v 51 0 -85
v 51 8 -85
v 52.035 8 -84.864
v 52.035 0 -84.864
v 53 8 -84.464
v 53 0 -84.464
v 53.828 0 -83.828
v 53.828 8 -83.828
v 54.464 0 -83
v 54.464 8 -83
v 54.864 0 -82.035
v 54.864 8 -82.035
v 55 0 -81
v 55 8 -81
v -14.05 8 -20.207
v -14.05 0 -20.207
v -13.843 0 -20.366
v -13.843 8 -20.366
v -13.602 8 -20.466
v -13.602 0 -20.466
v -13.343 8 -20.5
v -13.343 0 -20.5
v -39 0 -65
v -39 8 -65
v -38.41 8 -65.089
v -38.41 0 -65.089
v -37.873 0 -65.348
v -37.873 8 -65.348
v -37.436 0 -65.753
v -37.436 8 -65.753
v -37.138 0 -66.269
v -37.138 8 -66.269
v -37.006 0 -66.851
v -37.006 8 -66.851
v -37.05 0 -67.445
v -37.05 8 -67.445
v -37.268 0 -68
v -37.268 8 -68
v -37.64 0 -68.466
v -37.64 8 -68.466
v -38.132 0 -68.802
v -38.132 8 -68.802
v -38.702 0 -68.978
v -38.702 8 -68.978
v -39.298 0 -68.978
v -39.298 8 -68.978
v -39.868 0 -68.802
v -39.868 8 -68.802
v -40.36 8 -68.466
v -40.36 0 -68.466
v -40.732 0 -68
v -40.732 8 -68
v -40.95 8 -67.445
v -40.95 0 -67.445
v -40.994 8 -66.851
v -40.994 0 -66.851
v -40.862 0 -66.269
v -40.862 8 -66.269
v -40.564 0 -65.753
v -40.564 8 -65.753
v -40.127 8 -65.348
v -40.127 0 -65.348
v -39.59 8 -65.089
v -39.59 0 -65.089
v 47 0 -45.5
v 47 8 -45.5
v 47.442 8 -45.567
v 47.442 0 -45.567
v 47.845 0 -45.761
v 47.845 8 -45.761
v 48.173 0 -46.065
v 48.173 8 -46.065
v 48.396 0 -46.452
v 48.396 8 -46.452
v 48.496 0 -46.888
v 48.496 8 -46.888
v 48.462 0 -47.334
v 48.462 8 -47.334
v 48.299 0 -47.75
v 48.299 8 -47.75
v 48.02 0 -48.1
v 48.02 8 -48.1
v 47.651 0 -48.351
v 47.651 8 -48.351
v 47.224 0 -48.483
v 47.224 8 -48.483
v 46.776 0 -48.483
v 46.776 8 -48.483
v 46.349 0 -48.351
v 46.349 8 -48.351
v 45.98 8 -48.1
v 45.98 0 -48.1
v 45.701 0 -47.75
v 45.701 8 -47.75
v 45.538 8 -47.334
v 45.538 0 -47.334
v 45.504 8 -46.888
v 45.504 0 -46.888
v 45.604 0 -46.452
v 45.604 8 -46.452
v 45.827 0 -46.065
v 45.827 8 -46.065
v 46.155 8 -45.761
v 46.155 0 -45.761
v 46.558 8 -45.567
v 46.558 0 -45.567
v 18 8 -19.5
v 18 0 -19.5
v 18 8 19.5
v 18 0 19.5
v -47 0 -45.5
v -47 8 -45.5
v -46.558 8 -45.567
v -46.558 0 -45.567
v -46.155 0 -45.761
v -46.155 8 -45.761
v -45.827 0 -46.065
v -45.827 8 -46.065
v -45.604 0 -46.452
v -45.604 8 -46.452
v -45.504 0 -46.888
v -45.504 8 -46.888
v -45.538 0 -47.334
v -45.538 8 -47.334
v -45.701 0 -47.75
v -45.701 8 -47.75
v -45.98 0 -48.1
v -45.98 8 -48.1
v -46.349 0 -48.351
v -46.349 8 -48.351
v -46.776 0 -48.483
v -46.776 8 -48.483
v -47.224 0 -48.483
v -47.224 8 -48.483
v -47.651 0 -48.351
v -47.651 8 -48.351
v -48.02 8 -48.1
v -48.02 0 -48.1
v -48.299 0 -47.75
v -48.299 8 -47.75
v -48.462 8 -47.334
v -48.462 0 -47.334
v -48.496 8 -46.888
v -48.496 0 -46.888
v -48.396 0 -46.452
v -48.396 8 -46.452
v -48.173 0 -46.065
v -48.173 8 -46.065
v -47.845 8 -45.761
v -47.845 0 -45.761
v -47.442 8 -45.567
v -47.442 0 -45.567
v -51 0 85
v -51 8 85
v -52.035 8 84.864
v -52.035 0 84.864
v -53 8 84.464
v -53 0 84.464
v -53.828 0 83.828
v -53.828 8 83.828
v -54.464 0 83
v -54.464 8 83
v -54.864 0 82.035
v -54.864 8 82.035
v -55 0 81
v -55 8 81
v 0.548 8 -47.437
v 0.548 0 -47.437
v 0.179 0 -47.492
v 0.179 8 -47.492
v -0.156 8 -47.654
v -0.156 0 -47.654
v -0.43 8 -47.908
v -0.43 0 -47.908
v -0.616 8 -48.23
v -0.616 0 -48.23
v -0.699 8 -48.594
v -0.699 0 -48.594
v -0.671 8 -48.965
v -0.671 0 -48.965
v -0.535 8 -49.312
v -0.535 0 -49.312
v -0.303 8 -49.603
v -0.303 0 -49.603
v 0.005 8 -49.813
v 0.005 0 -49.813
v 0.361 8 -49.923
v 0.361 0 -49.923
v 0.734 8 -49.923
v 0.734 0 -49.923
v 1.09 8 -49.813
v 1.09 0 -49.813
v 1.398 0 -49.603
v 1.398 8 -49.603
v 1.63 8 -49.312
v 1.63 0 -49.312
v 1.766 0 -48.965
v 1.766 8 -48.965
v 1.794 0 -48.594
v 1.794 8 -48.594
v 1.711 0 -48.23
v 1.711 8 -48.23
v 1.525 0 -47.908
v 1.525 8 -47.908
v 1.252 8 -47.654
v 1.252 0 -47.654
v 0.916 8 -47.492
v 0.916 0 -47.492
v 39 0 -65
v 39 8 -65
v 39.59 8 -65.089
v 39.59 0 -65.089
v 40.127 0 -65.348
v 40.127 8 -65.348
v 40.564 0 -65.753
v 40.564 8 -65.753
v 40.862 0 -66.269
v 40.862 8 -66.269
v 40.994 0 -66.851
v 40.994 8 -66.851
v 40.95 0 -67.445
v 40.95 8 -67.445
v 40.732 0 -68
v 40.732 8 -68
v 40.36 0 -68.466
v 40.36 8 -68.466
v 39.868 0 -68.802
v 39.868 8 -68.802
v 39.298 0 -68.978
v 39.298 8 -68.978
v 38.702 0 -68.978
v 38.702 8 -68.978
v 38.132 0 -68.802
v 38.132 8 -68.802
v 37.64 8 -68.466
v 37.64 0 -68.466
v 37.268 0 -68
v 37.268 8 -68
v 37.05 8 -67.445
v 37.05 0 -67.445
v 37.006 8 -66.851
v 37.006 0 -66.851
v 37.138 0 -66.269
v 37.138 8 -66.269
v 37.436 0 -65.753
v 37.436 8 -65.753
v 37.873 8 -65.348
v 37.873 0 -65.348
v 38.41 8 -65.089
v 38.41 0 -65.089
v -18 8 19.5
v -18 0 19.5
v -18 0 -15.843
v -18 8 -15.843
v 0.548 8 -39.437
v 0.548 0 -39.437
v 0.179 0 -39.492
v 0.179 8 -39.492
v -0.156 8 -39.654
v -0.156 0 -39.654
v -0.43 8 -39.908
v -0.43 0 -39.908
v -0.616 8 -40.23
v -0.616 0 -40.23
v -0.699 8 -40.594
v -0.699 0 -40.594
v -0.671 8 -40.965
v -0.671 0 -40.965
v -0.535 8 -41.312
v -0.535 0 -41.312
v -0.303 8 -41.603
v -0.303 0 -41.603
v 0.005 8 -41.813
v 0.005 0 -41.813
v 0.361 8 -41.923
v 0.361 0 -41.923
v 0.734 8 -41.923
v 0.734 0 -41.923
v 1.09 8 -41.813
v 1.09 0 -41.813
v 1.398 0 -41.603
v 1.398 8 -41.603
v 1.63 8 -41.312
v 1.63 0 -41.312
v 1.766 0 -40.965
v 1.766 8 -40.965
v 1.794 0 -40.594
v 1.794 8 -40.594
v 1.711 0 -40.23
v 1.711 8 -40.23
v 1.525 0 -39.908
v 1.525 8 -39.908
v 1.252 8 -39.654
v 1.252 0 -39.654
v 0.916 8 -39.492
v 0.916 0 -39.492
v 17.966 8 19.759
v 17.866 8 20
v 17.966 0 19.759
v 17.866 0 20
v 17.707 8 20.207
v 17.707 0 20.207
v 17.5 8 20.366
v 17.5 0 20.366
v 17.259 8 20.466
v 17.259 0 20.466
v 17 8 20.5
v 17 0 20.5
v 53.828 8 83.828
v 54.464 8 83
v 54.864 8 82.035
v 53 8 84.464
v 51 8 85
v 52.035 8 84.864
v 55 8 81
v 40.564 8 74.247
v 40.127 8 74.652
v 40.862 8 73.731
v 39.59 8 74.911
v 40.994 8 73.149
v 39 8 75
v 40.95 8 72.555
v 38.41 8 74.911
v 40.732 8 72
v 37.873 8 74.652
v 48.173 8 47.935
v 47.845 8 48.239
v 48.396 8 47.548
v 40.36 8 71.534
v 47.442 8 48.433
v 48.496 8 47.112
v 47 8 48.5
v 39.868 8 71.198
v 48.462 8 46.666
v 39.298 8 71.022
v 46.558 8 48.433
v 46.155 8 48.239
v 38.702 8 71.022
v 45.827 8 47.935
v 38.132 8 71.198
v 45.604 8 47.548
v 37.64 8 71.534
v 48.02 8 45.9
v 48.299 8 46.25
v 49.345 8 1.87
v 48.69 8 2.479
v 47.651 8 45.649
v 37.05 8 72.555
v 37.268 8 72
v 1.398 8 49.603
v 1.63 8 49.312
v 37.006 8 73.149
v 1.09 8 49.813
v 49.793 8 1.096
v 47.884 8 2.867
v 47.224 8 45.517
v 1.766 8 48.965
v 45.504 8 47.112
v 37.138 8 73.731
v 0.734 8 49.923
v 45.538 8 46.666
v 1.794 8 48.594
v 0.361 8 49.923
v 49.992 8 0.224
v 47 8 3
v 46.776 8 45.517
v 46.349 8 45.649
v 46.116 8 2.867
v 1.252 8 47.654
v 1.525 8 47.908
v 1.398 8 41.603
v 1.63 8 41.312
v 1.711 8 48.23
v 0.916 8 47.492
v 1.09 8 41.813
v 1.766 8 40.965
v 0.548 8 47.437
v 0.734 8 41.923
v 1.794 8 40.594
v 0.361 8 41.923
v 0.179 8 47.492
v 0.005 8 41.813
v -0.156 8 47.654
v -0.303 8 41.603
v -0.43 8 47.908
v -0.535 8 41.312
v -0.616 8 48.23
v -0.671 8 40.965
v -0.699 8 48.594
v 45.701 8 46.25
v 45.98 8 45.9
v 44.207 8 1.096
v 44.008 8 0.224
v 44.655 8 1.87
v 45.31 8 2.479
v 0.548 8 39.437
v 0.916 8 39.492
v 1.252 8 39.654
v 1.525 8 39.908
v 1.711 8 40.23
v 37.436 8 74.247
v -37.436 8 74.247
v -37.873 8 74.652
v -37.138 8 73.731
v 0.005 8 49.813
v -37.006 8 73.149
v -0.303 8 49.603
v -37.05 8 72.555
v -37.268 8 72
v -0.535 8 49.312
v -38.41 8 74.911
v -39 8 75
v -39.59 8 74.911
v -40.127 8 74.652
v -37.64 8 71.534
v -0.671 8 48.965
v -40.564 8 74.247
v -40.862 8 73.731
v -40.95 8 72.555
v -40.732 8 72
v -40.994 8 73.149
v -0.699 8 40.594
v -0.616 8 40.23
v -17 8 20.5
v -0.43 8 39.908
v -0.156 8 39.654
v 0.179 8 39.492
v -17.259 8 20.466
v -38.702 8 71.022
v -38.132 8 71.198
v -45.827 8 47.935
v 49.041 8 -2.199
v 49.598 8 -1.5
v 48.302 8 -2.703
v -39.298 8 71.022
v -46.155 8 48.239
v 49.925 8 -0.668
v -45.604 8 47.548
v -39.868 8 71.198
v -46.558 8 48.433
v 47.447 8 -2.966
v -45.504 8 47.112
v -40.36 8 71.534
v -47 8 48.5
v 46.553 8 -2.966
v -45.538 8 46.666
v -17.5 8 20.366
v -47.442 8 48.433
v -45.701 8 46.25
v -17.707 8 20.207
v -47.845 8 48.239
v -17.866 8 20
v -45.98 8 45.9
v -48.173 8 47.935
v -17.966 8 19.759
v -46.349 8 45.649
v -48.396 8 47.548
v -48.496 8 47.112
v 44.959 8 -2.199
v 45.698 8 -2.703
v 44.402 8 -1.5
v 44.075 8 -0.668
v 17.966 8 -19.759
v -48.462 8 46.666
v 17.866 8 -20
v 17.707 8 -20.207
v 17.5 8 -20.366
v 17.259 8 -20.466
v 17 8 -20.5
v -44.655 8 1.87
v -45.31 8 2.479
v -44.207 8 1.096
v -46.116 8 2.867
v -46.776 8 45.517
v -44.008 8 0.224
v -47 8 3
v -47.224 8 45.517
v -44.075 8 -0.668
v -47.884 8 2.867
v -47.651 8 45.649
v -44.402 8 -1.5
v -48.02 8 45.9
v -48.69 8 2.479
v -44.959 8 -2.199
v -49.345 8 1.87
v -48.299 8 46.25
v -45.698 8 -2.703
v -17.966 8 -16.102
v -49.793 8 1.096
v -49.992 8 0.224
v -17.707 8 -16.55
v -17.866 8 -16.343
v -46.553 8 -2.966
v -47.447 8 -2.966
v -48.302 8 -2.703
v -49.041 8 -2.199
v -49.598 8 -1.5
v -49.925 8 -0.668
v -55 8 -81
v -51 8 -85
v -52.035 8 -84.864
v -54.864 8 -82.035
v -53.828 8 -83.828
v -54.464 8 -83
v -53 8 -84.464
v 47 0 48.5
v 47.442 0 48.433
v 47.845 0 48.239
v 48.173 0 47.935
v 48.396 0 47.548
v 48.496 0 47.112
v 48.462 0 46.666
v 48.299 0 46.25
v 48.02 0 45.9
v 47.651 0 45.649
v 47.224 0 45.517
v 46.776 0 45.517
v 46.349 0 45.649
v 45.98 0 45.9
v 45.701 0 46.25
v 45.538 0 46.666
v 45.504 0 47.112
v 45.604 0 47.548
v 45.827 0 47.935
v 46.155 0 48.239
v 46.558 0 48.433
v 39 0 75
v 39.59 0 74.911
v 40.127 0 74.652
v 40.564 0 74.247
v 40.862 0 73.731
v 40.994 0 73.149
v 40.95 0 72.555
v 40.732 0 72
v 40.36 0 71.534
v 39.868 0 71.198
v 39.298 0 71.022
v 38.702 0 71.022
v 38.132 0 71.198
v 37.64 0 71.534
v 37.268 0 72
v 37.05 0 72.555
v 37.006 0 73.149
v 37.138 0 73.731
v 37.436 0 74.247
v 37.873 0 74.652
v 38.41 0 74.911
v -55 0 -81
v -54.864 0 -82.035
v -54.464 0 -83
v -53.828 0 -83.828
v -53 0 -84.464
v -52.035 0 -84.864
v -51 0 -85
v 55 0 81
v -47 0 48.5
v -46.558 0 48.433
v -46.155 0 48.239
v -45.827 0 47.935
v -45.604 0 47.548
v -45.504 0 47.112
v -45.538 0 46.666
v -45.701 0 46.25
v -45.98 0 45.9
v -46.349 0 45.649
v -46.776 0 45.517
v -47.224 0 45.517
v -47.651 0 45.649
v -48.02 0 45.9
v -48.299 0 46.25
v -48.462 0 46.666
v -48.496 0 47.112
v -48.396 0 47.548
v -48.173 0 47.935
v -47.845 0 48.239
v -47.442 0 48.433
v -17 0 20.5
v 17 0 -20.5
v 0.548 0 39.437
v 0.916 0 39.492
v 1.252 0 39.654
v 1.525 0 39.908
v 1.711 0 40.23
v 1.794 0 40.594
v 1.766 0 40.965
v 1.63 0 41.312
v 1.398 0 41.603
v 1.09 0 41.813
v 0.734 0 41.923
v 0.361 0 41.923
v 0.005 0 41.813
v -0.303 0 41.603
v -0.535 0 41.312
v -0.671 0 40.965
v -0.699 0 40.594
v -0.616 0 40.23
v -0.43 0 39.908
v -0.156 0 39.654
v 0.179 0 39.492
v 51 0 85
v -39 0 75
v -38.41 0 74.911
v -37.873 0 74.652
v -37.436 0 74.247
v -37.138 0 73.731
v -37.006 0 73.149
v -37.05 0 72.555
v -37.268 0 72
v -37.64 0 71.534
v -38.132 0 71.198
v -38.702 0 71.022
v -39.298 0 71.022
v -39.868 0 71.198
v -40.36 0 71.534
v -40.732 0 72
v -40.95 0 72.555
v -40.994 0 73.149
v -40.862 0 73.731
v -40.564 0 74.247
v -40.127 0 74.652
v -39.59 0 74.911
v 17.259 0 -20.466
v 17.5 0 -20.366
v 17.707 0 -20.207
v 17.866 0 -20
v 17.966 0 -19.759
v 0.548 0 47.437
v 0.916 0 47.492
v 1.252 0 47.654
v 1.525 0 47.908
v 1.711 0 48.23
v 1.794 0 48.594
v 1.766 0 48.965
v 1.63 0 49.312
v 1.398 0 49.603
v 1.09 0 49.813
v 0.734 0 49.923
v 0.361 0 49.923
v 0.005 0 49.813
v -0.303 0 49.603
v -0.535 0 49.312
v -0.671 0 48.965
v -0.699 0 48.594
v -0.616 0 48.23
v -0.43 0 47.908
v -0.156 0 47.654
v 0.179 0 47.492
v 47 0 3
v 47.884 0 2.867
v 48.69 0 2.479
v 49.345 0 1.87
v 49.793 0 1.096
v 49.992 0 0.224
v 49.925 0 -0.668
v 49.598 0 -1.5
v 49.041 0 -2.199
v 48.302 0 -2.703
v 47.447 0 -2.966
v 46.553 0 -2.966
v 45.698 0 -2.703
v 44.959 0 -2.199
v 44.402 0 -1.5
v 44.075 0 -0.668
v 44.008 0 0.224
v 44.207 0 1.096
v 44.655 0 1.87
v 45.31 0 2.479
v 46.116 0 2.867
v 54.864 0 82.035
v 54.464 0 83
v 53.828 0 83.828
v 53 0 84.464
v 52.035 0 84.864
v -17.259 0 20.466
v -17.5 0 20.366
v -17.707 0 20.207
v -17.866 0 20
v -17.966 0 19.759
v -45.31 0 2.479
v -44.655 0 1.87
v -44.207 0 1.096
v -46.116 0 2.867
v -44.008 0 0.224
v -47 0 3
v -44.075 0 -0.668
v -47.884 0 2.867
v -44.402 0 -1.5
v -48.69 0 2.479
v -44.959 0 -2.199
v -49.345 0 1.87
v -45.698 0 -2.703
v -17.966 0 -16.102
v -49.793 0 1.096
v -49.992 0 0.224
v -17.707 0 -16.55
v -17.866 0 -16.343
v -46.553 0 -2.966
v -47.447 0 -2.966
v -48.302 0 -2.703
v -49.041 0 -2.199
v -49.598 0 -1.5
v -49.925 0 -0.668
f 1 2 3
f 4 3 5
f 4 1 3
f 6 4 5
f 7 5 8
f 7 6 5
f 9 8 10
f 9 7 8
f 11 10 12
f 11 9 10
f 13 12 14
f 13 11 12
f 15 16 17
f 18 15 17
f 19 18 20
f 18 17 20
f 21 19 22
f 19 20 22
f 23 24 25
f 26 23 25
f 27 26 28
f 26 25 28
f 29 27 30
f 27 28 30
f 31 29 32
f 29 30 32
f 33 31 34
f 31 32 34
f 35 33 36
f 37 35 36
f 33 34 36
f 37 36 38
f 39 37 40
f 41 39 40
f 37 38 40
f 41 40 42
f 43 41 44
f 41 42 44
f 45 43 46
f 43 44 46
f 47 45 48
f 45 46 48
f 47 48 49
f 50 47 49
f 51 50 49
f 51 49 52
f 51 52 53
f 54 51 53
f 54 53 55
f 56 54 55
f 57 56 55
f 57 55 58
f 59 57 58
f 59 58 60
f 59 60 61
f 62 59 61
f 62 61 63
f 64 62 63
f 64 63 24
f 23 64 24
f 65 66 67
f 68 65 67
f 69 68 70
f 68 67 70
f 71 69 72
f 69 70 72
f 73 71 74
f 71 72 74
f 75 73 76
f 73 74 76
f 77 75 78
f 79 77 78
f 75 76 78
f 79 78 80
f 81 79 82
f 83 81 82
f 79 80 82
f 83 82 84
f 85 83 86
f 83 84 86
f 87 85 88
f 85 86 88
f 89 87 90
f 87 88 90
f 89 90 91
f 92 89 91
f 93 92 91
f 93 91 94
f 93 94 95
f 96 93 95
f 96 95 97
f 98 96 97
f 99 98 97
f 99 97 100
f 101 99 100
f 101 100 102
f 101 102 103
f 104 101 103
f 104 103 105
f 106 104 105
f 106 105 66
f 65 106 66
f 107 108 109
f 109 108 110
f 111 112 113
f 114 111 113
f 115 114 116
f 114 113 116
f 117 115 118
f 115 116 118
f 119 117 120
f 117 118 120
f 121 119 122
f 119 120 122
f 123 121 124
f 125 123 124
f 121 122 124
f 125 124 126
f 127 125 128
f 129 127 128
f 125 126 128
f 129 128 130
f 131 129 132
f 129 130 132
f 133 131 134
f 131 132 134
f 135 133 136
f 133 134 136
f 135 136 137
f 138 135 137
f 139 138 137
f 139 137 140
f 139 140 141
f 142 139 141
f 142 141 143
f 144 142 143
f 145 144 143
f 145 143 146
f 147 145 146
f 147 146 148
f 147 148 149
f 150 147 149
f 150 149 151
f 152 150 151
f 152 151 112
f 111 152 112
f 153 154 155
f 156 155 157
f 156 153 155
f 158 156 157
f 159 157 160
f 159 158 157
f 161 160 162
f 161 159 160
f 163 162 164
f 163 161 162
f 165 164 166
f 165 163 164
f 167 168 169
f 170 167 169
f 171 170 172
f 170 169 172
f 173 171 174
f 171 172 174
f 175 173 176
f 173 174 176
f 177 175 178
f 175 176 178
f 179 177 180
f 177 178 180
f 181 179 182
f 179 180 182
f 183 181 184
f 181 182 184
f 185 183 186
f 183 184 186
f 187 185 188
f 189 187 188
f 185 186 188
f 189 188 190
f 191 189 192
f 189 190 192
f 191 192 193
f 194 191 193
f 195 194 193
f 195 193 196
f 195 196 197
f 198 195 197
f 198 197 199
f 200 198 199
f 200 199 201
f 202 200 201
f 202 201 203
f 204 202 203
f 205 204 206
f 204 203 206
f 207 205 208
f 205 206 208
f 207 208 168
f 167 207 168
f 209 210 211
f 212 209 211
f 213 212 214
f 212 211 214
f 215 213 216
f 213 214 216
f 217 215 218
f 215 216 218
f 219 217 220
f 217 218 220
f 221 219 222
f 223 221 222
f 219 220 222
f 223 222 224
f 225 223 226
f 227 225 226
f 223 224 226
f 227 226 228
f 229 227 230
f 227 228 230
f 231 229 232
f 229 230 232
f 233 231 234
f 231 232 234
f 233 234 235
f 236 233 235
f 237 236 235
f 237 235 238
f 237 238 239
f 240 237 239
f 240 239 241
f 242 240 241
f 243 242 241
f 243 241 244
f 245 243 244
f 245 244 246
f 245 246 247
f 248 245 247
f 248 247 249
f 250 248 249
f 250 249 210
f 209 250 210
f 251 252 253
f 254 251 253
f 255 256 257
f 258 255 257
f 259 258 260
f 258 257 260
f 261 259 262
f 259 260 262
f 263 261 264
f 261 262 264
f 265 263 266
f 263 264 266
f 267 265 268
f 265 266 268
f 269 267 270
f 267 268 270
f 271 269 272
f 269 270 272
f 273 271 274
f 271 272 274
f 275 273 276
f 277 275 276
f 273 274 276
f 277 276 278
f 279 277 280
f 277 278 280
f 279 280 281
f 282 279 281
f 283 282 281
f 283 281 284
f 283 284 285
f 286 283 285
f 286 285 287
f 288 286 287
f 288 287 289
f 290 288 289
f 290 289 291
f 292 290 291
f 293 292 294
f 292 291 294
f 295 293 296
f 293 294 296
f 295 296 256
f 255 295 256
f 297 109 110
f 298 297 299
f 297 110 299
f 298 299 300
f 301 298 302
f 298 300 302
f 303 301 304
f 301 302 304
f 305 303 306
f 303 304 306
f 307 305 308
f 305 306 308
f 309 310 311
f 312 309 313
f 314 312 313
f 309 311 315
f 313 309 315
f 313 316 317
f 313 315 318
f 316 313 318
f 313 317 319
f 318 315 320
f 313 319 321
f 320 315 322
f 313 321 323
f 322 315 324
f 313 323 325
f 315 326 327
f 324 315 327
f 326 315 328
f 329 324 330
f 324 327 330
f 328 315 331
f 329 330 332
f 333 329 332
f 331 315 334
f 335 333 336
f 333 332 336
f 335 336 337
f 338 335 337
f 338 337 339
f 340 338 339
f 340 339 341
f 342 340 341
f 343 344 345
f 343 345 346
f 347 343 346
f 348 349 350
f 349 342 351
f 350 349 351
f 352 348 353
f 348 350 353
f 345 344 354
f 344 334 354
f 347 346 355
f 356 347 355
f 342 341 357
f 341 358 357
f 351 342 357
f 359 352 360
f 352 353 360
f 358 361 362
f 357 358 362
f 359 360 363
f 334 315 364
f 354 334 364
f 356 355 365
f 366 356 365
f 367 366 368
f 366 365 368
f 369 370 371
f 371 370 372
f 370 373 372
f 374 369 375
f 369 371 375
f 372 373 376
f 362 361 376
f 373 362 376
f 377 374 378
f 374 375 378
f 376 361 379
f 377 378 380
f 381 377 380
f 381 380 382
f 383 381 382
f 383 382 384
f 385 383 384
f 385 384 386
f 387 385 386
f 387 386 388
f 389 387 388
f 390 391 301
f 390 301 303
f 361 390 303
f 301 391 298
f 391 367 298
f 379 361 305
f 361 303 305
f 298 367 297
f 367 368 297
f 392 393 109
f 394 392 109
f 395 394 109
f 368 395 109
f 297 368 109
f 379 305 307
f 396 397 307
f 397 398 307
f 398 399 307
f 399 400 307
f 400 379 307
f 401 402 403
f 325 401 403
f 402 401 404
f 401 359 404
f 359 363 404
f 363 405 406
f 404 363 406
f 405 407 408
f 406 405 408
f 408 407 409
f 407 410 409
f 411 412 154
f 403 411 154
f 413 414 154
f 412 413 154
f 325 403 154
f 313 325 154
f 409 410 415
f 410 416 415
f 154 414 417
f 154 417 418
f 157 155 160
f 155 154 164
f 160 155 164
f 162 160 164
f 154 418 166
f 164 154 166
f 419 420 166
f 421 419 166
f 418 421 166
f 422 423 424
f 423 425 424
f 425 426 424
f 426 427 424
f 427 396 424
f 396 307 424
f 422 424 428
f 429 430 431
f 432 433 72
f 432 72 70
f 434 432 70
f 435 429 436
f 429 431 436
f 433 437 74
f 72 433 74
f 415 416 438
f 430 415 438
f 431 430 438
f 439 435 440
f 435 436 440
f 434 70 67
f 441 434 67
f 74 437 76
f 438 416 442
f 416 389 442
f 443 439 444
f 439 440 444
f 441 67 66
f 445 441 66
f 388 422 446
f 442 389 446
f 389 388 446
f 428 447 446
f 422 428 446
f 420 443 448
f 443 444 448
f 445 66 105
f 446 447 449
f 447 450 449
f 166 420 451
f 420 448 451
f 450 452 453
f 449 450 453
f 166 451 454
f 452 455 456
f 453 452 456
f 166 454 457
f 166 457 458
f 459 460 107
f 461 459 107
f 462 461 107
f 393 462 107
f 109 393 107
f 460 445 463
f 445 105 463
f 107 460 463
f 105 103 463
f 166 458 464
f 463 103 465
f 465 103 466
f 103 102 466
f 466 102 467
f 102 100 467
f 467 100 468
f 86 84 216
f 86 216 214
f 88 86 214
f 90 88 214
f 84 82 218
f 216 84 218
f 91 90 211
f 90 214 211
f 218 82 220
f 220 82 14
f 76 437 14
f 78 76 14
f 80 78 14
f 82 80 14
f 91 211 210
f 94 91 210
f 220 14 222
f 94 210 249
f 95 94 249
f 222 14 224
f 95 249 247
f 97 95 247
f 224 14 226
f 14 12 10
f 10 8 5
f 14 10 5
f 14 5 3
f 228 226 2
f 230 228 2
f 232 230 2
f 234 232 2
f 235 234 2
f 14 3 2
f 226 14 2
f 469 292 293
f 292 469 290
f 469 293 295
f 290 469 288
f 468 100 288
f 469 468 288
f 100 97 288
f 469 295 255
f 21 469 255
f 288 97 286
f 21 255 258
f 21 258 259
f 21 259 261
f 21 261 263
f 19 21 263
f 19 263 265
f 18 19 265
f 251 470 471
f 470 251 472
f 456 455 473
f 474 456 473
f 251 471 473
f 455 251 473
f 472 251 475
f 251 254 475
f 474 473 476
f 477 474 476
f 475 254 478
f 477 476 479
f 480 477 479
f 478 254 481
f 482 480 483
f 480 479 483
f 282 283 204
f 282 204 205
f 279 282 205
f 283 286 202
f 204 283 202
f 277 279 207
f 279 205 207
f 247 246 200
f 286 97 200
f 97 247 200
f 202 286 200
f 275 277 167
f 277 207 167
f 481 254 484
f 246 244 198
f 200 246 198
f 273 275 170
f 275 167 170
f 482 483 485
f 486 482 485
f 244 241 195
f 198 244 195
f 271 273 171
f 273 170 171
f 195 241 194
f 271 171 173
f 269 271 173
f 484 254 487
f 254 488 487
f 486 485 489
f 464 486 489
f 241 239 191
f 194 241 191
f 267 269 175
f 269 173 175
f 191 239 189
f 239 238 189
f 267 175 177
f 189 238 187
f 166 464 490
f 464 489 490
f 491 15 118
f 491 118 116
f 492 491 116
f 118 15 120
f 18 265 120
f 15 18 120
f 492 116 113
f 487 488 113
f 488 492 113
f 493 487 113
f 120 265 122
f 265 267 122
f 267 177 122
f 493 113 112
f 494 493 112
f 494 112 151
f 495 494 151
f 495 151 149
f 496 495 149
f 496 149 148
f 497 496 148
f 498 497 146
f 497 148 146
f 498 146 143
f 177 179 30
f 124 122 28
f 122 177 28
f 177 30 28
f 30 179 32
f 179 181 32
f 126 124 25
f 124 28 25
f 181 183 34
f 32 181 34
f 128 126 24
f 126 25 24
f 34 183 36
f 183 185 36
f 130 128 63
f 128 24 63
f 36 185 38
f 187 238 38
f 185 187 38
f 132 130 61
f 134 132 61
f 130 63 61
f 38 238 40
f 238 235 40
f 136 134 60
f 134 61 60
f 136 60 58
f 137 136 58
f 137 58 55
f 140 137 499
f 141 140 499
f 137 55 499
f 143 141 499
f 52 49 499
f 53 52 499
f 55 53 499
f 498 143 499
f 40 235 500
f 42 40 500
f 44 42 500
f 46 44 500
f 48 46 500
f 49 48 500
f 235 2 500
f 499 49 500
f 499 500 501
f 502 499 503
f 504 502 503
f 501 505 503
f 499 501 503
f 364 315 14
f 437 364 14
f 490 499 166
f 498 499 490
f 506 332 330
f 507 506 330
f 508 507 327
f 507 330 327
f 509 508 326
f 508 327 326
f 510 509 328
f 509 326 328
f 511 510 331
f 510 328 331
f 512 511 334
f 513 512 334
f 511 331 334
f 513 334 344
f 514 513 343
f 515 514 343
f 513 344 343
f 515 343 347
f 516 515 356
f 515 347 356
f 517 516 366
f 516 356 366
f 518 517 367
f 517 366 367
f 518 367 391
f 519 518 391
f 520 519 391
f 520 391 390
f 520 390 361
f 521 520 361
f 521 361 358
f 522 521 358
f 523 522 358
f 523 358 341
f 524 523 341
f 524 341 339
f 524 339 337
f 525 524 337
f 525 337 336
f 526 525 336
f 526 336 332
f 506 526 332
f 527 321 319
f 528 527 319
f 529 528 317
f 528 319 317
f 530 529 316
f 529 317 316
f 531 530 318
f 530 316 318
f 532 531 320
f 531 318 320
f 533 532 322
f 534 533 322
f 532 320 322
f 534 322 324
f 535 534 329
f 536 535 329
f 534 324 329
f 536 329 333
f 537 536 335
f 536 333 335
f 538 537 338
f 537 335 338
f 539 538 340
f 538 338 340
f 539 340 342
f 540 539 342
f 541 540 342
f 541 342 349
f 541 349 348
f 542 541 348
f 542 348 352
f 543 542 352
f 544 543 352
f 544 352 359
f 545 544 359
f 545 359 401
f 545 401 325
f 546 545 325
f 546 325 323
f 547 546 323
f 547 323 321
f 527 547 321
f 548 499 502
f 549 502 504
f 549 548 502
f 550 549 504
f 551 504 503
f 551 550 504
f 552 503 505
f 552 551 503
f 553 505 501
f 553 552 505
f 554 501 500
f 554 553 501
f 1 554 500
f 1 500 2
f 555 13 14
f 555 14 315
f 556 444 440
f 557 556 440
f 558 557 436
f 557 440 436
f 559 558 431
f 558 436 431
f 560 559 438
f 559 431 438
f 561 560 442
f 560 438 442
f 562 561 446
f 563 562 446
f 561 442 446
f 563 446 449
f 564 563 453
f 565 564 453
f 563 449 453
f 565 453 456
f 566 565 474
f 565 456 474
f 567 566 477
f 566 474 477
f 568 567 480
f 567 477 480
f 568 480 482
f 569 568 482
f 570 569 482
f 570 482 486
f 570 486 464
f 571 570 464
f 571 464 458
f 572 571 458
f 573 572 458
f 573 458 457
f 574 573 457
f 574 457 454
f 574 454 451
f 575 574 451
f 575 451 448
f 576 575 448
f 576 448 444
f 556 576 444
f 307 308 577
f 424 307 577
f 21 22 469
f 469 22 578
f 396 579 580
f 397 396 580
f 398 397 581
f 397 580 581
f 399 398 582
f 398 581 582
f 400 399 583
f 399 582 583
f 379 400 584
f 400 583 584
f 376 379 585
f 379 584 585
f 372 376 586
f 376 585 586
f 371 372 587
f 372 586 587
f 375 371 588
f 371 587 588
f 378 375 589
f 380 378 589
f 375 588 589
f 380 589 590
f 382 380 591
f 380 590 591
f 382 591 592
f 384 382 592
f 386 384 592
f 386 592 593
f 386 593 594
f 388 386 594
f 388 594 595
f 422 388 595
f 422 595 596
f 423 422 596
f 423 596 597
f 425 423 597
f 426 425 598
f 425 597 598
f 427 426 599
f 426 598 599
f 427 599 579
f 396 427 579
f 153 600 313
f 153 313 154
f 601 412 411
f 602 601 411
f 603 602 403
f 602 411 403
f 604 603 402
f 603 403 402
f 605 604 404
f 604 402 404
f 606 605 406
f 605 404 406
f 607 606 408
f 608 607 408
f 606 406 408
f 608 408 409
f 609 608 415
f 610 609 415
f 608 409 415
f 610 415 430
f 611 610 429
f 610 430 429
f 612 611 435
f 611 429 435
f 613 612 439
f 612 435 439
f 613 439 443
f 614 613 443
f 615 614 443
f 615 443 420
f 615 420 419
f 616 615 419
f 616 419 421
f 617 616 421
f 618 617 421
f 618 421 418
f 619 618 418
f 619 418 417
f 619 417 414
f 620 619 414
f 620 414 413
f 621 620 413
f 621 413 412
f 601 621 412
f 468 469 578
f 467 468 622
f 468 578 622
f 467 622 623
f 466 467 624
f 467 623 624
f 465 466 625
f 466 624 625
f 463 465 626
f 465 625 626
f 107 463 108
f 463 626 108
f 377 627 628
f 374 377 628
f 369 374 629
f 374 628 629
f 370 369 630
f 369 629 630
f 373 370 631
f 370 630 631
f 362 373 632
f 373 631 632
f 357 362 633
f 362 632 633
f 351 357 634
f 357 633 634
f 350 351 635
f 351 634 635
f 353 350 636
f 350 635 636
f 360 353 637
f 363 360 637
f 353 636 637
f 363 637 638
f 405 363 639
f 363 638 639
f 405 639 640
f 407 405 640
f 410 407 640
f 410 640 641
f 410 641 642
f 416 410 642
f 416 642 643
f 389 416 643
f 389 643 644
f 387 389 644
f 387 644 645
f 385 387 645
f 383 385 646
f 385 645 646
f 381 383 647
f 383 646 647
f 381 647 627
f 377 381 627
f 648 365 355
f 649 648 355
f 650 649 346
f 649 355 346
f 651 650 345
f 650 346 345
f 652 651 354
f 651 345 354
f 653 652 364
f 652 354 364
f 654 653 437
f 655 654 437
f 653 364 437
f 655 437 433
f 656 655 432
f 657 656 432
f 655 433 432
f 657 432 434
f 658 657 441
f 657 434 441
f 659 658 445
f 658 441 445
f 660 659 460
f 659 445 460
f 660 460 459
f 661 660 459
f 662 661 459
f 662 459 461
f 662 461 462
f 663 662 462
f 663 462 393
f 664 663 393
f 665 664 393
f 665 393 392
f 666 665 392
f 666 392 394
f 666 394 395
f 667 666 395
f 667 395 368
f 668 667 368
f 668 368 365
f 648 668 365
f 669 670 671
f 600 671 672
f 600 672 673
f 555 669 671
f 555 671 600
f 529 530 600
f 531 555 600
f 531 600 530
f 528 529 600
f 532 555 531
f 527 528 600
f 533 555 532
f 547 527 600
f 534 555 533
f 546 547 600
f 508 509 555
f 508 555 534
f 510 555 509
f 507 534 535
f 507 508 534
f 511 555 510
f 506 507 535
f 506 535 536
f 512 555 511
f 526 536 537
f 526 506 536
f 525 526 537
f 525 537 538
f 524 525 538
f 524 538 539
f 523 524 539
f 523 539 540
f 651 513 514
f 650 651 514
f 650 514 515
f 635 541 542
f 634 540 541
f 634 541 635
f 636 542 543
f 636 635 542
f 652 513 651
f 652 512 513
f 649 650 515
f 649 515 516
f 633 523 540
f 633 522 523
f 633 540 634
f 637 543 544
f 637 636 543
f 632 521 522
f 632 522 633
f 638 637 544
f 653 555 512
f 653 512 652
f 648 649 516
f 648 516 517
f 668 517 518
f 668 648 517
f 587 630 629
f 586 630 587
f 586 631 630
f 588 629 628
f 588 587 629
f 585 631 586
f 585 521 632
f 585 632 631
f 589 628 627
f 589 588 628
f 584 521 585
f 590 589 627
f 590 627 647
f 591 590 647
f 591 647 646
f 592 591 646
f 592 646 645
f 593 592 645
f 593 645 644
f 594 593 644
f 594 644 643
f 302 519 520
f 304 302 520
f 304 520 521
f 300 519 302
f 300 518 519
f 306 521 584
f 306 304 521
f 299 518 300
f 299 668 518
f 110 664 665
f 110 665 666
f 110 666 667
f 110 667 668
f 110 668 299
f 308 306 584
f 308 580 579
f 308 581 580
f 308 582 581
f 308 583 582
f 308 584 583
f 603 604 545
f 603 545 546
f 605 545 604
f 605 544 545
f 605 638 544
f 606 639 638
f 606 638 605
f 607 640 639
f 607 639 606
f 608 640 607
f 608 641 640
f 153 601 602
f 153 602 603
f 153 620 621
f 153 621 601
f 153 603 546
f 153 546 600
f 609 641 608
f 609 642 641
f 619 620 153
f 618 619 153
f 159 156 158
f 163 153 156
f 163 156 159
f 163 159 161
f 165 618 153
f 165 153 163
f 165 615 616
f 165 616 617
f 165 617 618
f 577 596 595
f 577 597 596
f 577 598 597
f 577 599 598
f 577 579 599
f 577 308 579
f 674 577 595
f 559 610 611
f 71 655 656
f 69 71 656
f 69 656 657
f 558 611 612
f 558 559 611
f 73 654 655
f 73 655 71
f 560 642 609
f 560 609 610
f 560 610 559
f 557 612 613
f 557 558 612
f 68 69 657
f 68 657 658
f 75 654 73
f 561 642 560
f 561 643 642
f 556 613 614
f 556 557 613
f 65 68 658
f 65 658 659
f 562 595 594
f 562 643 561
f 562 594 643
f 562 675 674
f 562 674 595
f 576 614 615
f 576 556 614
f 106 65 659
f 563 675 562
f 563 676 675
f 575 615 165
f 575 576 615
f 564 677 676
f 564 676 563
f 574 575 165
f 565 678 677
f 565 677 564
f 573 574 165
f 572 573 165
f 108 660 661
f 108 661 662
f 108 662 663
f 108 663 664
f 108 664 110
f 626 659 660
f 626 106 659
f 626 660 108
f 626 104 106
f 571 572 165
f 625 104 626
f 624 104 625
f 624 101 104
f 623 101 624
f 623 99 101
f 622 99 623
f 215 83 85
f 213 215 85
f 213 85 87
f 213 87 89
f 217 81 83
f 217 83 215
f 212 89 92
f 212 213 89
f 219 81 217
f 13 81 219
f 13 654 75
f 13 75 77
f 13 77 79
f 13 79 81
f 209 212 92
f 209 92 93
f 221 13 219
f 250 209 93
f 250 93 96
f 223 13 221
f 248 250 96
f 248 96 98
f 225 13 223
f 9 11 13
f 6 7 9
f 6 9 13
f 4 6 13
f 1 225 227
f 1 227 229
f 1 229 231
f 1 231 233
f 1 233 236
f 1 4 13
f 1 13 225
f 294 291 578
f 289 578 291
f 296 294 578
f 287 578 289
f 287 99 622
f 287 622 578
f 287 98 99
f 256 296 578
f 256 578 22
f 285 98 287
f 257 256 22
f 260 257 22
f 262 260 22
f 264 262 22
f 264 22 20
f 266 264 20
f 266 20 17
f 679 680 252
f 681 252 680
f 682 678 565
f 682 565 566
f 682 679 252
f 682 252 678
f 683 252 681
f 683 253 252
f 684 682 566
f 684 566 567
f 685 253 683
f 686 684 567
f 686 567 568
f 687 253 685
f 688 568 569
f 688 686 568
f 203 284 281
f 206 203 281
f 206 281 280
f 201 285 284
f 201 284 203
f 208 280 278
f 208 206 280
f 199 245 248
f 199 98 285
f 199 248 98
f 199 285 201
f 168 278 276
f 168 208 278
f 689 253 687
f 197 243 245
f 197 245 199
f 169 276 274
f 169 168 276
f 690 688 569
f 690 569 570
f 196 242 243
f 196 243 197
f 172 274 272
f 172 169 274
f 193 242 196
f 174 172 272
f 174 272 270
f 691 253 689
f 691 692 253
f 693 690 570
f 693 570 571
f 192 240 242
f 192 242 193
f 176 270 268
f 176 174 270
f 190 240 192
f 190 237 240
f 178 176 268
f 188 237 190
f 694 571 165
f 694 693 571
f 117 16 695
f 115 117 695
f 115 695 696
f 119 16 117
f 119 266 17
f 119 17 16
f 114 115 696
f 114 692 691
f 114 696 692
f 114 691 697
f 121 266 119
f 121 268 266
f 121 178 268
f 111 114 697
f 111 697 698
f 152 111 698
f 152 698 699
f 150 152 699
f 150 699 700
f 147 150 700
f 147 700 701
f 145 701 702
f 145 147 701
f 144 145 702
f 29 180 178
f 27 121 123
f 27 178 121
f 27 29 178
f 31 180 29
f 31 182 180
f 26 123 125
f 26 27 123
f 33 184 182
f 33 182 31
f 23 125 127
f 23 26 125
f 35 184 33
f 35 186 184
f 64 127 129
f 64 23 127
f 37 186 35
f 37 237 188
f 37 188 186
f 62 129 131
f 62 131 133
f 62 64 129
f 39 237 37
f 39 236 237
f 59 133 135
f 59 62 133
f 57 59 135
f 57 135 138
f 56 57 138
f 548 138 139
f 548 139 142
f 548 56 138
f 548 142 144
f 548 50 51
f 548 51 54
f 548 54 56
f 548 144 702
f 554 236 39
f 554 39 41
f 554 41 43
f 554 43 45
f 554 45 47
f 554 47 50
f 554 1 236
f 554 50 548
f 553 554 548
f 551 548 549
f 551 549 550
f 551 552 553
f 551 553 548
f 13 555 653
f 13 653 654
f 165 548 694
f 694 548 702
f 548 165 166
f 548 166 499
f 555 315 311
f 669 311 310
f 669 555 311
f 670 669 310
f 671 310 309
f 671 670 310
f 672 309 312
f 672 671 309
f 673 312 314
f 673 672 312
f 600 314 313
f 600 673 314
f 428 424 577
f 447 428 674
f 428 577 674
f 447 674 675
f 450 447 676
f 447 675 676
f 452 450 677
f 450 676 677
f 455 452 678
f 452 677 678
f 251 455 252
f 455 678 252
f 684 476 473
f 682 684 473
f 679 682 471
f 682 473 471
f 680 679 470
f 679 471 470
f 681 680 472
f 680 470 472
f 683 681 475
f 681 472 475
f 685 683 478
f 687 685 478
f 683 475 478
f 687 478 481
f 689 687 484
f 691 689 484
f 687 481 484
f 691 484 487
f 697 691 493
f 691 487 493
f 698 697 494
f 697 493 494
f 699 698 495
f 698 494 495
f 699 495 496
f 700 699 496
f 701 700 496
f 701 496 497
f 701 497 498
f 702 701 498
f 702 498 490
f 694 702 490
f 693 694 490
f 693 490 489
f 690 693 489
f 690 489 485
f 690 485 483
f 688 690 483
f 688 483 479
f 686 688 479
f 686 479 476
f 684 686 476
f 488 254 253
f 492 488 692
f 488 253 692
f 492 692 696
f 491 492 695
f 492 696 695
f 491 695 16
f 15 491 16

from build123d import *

# Parameters (mm, degrees)
SALIENTE_EXTRUIR1_DEPTH = 8
CROQUIS2_R              = 2
CROQUIS2_R_2            = 1.5
CROQUIS2_R_3            = 3
CORTAR_EXTRUIR1_DEPTH   = 18
CROQUIS3_W              = 36
CROQUIS3_H              = 41
CORTAR_EXTRUIR2_DEPTH   = 8
CROQUIS4_W              = 50
CROQUIS4_H              = 90
CORTAR_EXTRUIR3_DEPTH   = 8
CROQUIS5_W              = 59.93105858
CROQUIS5_H              = 100.56613239
SALIENTE_EXTRUIR2_DEPTH = 8
CROQUIS7_W              = 94.273148937
CROQUIS7_H              = 8.636825756
SALIENTE_EXTRUIR3_DEPTH = 8
CROQUIS8_R              = 2
CORTAR_EXTRUIR4_DEPTH   = 102.557865279
CROQUIS9_R              = 1.25
CORTAR_EXTRUIR5_DEPTH   = 8


with BuildPart() as part:
    # Croquis1 → Saliente-Extruir1 (new body)
    with BuildSketch(Plane(origin=(0, 0, 0), x_dir=(1, 0, 0), z_dir=(0, 1, 0))):
        with BuildLine():
            Line((-51, 85), (51, 85))
            ThreePointArc((51, 85), (53.828427125, 83.828427125), (55, 81))
            Line((55, 81), (55, -81))
            ThreePointArc((55, -81), (53.828427125, -83.828427125), (51, -85))
            Line((51, -85), (-51, -85))
            ThreePointArc((-51, -85), (-53.828427125, -83.828427125), (-55, -81))
            Line((-55, -81), (-55, 81))
            ThreePointArc((-55, 81), (-53.828427125, 83.828427125), (-51, 85))
        make_face()
    extrude(amount=SALIENTE_EXTRUIR1_DEPTH)

    # Croquis2 → Cortar-Extruir1 (cut)
    with BuildSketch(Plane(origin=(0, 8, 0), x_dir=(1, 0, 0), z_dir=(0, 1, 0))):
        with Locations(Location((-39, 73, 0), (0, 0, 270))):
            Circle(CROQUIS2_R)
        with Locations(Location((-47, 47, 0), (0, 0, 270))):
            Circle(CROQUIS2_R_2)
        with Locations(Location((47, 47, 0), (0, 0, 270))):
            Circle(CROQUIS2_R_2)
        with Locations(Location((39, 73, 0), (0, 0, 270))):
            Circle(CROQUIS2_R)
        with Locations(Location((39, -73, 0), (0, 0, 270))):
            Circle(CROQUIS2_R)
        with Locations(Location((47, -47, 0), (0, 0, 270))):
            Circle(CROQUIS2_R_2)
        with Locations(Location((-47, -47, 0), (0, 0, 270))):
            Circle(CROQUIS2_R_2)
        with Locations(Location((-39, -73, 0), (0, 0, 270))):
            Circle(CROQUIS2_R)
        with Locations(Location((-47, 0, 0), (0, 0, 270))):
            Circle(CROQUIS2_R_3)
        with Locations(Location((47, 0, 0), (0, 0, 270))):
            Circle(CROQUIS2_R_3)
    extrude(amount=-CORTAR_EXTRUIR1_DEPTH, mode=Mode.SUBTRACT)

    # Croquis3 → Cortar-Extruir2 (cut)
    with BuildSketch(Plane(origin=(0, 8, 0), x_dir=(1, 0, 0), z_dir=(0, 1, 0))):
        Rectangle(CROQUIS3_W, CROQUIS3_H)
    extrude(amount=-CORTAR_EXTRUIR2_DEPTH, mode=Mode.SUBTRACT)

    # Croquis4 → Cortar-Extruir3 (cut)
    with BuildSketch(Plane.XZ):
        Rectangle(CROQUIS4_W, CROQUIS4_H)
    extrude(amount=-CORTAR_EXTRUIR3_DEPTH, mode=Mode.SUBTRACT)

    # Croquis5 → Saliente-Extruir2 (add)
    with BuildSketch(Plane.XZ):
        with Locations((0.580457048, 0.547604551)):
            Rectangle(CROQUIS5_W, CROQUIS5_H)
        with BuildLine():
            Line((-13.343145751, -20.5), (17, -20.5))
            ThreePointArc((17, -20.5), (17.707106781, -20.207106781), (18, -19.5))
            Line((18, -19.5), (18, 19.5))
            ThreePointArc((18, 19.5), (17.707106781, 20.207106781), (17, 20.5))
            Line((17, 20.5), (-17, 20.5))
            ThreePointArc((-17, 20.5), (-17.707106781, 20.207106781), (-18, 19.5))
            Line((-18, 19.5), (-18, -15.843145751))
            ThreePointArc((-18, -15.843145751), (-17.923879533, -16.225829183), (-17.707106781, -16.550252532))
            Line((-17.707106781, -16.550252532), (-14.050252532, -20.207106781))
            ThreePointArc((-14.050252532, -20.207106781), (-13.725829183, -20.423879533), (-13.343145751, -20.5))
        make_face(mode=Mode.SUBTRACT)
    extrude(amount=-SALIENTE_EXTRUIR2_DEPTH)

    # Croquis7 → Saliente-Extruir3 (add)
    with BuildSketch(Plane(origin=(0, 8, 0), x_dir=(1, 0, 0), z_dir=(0, 1, 0))):
        with Locations((1.18677705, 71.991192559)):
            Rectangle(CROQUIS7_W, CROQUIS7_H)
    extrude(amount=-SALIENTE_EXTRUIR3_DEPTH)

    # Croquis8 → Cortar-Extruir4 (cut, through all)
    with BuildSketch(Plane(origin=(0, 8, 0), x_dir=(1, 0, 0), z_dir=(0, 1, 0))):
        with Locations(Location((-39, 67, 0), (0, 0, 270))):
            Circle(CROQUIS8_R)
        with Locations(Location((39, 67, 0), (0, 0, 270))):
            Circle(CROQUIS8_R)
    extrude(amount=-CORTAR_EXTRUIR4_DEPTH, mode=Mode.SUBTRACT)

    # Croquis9 → Cortar-Extruir5 (cut)
    with BuildSketch(Plane.XZ):
        with Locations(Location((0.547678372, 40.686961559, 0), (0, 0, 270))):
            Circle(CROQUIS9_R)
        with Locations(Location((0.547678372, 48.686961559, 0), (0, 0, 270))):
            Circle(CROQUIS9_R)
        with Locations(Location((0.547678372, -48.686961559, 0), (0, 0, 90))):
            Circle(CROQUIS9_R)
        with Locations(Location((0.547678372, -40.686961559, 0), (0, 0, 90))):
            Circle(CROQUIS9_R)
    extrude(amount=-CORTAR_EXTRUIR5_DEPTH, mode=Mode.SUBTRACT)


solid = part.part
